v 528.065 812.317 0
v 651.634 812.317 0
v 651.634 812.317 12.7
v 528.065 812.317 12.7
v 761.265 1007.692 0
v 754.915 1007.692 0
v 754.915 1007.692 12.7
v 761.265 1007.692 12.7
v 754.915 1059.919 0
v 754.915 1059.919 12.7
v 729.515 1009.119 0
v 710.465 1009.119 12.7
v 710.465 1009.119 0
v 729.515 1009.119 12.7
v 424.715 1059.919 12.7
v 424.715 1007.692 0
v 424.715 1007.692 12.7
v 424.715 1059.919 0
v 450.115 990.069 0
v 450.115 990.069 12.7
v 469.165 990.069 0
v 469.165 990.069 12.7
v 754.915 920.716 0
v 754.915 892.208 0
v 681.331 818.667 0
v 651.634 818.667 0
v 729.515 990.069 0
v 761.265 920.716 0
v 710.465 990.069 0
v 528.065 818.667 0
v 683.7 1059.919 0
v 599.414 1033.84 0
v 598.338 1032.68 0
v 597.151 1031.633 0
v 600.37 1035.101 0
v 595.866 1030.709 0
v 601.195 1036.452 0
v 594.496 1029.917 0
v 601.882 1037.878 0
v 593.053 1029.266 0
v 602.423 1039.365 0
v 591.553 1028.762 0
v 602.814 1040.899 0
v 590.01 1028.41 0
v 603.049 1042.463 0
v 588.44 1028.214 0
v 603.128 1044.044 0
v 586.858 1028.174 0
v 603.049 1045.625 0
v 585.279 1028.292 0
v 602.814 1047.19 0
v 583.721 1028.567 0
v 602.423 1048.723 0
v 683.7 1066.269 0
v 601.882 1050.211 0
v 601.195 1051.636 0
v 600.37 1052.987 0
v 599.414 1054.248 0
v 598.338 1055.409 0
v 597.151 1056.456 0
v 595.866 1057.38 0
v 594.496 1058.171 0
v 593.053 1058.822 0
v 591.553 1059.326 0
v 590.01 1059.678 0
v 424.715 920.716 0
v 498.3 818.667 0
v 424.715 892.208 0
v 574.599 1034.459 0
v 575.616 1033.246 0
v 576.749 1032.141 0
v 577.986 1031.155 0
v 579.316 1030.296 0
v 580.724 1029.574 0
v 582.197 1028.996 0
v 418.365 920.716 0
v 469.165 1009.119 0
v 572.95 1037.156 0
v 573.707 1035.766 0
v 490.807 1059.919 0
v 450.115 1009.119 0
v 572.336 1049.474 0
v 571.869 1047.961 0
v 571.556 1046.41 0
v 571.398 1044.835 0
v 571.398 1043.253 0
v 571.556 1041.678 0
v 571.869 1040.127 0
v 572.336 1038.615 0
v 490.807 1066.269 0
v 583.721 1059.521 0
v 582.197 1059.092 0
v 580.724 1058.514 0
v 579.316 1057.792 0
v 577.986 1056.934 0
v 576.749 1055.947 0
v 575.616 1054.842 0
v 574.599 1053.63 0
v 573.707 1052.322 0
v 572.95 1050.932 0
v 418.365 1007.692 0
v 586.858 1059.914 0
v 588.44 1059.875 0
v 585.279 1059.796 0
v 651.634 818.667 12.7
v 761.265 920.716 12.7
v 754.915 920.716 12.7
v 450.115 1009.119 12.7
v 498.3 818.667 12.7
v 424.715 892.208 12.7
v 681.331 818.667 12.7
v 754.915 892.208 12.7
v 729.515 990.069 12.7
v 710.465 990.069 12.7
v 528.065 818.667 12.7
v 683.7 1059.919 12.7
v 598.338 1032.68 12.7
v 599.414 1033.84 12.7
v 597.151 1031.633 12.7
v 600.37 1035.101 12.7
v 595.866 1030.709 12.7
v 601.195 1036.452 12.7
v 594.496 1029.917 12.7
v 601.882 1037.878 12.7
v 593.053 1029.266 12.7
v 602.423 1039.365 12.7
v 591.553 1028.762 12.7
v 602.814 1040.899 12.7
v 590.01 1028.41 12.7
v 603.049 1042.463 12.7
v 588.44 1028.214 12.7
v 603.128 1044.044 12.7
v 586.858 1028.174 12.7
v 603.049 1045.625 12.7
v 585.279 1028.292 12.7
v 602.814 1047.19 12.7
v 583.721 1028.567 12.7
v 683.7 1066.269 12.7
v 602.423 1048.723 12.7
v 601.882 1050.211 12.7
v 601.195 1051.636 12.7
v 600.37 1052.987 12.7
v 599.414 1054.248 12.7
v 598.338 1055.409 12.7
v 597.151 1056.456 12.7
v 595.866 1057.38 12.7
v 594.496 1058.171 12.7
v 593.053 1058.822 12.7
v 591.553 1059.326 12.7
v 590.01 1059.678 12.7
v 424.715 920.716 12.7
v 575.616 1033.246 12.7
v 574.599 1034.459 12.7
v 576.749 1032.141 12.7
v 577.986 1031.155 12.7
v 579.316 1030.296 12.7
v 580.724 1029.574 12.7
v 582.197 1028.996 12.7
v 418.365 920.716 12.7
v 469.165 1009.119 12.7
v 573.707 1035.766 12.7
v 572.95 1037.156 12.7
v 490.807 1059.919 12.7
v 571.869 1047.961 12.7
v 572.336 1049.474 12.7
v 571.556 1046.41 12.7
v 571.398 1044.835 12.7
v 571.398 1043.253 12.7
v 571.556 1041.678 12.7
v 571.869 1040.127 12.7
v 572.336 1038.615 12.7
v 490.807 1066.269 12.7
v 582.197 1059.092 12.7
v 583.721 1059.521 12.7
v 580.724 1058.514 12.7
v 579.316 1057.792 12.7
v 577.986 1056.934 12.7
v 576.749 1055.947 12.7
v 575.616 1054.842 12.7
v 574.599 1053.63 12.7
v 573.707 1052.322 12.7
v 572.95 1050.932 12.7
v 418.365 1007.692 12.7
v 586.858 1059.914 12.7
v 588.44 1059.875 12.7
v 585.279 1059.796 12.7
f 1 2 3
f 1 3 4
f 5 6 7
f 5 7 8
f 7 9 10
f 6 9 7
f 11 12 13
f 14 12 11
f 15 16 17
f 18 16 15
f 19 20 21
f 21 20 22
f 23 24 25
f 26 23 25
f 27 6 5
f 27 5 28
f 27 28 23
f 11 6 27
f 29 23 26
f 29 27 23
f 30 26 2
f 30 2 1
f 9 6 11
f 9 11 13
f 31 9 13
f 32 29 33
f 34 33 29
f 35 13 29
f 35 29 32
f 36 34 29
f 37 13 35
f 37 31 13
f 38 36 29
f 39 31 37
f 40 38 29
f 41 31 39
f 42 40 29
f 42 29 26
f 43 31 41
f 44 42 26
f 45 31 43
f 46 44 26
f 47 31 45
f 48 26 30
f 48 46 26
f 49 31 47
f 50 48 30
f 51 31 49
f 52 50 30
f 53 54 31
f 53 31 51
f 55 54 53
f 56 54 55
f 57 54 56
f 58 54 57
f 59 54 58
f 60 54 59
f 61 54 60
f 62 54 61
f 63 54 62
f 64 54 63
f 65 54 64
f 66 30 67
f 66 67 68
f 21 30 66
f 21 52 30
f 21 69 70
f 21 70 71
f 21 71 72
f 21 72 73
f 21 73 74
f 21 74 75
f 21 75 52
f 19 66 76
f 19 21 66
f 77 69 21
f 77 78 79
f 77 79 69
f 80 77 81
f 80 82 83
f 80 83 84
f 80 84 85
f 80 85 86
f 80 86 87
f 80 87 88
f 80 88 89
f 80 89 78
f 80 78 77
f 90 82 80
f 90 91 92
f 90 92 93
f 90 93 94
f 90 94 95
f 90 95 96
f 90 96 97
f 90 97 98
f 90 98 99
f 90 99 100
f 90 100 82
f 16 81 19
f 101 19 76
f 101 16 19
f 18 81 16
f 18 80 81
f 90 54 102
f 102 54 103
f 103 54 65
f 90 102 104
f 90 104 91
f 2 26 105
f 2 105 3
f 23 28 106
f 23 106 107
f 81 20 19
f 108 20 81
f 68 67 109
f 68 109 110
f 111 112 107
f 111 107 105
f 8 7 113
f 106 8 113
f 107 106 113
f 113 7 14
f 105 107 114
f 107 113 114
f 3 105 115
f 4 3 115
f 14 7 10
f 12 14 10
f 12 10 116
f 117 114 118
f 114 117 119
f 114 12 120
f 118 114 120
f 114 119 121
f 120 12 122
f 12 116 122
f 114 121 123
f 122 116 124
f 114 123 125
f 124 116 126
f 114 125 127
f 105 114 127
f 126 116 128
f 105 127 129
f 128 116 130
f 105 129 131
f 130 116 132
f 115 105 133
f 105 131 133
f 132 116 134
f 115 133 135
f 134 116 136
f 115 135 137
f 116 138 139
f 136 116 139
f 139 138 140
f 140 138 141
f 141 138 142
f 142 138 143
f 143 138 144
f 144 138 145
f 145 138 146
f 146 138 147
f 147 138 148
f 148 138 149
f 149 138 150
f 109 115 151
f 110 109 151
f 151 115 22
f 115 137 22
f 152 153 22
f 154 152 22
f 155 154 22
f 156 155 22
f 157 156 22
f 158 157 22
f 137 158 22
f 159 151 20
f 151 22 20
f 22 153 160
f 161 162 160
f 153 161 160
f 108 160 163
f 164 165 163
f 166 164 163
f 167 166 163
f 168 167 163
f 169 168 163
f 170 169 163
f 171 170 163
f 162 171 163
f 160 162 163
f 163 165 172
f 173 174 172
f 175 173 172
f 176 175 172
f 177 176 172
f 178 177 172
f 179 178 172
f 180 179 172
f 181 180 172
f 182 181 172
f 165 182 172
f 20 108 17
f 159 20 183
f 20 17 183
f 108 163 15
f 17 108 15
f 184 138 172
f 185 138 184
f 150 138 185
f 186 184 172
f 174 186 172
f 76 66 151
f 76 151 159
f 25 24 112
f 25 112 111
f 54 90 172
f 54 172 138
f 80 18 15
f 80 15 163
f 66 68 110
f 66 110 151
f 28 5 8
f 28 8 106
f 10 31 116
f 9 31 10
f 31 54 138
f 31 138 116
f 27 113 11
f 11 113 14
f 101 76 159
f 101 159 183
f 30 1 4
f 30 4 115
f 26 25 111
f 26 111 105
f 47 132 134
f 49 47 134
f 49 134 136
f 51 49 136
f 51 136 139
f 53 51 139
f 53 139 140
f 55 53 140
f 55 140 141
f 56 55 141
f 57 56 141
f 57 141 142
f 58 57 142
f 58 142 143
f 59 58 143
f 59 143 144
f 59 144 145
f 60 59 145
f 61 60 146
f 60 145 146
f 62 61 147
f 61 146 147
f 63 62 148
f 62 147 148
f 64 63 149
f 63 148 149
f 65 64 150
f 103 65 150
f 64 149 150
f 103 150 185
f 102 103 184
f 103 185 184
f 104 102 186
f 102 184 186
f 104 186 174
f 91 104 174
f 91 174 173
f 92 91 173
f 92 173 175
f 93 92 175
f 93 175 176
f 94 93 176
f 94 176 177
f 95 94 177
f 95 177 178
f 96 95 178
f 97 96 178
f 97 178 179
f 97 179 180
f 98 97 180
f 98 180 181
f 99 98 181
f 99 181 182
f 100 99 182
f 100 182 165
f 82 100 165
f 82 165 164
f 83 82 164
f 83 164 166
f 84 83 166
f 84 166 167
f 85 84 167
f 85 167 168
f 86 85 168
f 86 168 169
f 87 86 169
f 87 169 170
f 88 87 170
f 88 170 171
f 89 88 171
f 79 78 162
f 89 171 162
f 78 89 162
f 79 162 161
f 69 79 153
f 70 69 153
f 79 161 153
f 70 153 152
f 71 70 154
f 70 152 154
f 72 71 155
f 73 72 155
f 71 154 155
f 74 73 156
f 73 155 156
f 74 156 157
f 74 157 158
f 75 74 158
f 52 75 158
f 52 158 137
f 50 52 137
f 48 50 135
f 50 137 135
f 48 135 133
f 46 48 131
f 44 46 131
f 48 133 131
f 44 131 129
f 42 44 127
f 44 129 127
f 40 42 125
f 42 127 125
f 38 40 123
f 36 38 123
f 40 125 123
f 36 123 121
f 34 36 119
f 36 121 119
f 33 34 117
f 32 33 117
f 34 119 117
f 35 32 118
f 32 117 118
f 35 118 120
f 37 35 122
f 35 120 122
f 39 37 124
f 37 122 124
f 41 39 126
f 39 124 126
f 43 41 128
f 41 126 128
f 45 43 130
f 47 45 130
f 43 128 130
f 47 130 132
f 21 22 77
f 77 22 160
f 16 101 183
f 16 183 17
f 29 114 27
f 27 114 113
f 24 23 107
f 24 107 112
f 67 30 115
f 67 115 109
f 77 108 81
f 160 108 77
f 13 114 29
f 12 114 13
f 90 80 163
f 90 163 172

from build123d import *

# Parameters (mm, degrees)
BOSS_EXTRUDE1_DEPTH = 12.7
SKETCH2_R           = 15.875
SKETCH2_W           = 19.05
SKETCH2_H           = 19.05
CUT_EXTRUDE1_DEPTH  = 13.7


with BuildPart() as part:
    # Sketch1 → Boss-Extrude1 (new body)
    with BuildSketch(Plane.XY):
        Polygon((424.715446324, 892.207843626), (424.715446324, 920.715652439), (418.365446324, 920.715652439), (418.365446324, 1007.691853389), (424.715446324, 1007.691853389), (424.715446324, 1059.919118431), (490.806723979, 1059.919118431), (490.806723979, 1066.269118431), (683.70003755, 1066.269118431), (683.70003755, 1059.919118431), (754.915446324, 1059.919118431), (754.915446324, 1007.691853389), (761.265446324, 1007.691853389), (761.265446324, 920.715652439), (754.915446324, 920.715652439), (754.915446324, 892.207843626), (681.331146762, 818.667305174), (651.634447679, 818.667305174), (651.634447679, 812.317305174), (528.064815274, 812.317305174), (528.064815274, 818.667305174), (498.299745887, 818.667305174), align=None)
    extrude(amount=BOSS_EXTRUDE1_DEPTH)

    # Sketch2 → Cut-Extrude1 (cut, through all)
    with BuildSketch(Plane.XY.offset(12.7)):
        with Locations((587.253380764, 1044.044118431)):
            Circle(SKETCH2_R)
        with Locations((459.640446324, 999.594118431)):
            Rectangle(SKETCH2_W, SKETCH2_H)
        with Locations((719.990446324, 999.594118431)):
            Rectangle(SKETCH2_W, SKETCH2_H)
    extrude(amount=-CUT_EXTRUDE1_DEPTH, mode=Mode.SUBTRACT)


solid = part.part
